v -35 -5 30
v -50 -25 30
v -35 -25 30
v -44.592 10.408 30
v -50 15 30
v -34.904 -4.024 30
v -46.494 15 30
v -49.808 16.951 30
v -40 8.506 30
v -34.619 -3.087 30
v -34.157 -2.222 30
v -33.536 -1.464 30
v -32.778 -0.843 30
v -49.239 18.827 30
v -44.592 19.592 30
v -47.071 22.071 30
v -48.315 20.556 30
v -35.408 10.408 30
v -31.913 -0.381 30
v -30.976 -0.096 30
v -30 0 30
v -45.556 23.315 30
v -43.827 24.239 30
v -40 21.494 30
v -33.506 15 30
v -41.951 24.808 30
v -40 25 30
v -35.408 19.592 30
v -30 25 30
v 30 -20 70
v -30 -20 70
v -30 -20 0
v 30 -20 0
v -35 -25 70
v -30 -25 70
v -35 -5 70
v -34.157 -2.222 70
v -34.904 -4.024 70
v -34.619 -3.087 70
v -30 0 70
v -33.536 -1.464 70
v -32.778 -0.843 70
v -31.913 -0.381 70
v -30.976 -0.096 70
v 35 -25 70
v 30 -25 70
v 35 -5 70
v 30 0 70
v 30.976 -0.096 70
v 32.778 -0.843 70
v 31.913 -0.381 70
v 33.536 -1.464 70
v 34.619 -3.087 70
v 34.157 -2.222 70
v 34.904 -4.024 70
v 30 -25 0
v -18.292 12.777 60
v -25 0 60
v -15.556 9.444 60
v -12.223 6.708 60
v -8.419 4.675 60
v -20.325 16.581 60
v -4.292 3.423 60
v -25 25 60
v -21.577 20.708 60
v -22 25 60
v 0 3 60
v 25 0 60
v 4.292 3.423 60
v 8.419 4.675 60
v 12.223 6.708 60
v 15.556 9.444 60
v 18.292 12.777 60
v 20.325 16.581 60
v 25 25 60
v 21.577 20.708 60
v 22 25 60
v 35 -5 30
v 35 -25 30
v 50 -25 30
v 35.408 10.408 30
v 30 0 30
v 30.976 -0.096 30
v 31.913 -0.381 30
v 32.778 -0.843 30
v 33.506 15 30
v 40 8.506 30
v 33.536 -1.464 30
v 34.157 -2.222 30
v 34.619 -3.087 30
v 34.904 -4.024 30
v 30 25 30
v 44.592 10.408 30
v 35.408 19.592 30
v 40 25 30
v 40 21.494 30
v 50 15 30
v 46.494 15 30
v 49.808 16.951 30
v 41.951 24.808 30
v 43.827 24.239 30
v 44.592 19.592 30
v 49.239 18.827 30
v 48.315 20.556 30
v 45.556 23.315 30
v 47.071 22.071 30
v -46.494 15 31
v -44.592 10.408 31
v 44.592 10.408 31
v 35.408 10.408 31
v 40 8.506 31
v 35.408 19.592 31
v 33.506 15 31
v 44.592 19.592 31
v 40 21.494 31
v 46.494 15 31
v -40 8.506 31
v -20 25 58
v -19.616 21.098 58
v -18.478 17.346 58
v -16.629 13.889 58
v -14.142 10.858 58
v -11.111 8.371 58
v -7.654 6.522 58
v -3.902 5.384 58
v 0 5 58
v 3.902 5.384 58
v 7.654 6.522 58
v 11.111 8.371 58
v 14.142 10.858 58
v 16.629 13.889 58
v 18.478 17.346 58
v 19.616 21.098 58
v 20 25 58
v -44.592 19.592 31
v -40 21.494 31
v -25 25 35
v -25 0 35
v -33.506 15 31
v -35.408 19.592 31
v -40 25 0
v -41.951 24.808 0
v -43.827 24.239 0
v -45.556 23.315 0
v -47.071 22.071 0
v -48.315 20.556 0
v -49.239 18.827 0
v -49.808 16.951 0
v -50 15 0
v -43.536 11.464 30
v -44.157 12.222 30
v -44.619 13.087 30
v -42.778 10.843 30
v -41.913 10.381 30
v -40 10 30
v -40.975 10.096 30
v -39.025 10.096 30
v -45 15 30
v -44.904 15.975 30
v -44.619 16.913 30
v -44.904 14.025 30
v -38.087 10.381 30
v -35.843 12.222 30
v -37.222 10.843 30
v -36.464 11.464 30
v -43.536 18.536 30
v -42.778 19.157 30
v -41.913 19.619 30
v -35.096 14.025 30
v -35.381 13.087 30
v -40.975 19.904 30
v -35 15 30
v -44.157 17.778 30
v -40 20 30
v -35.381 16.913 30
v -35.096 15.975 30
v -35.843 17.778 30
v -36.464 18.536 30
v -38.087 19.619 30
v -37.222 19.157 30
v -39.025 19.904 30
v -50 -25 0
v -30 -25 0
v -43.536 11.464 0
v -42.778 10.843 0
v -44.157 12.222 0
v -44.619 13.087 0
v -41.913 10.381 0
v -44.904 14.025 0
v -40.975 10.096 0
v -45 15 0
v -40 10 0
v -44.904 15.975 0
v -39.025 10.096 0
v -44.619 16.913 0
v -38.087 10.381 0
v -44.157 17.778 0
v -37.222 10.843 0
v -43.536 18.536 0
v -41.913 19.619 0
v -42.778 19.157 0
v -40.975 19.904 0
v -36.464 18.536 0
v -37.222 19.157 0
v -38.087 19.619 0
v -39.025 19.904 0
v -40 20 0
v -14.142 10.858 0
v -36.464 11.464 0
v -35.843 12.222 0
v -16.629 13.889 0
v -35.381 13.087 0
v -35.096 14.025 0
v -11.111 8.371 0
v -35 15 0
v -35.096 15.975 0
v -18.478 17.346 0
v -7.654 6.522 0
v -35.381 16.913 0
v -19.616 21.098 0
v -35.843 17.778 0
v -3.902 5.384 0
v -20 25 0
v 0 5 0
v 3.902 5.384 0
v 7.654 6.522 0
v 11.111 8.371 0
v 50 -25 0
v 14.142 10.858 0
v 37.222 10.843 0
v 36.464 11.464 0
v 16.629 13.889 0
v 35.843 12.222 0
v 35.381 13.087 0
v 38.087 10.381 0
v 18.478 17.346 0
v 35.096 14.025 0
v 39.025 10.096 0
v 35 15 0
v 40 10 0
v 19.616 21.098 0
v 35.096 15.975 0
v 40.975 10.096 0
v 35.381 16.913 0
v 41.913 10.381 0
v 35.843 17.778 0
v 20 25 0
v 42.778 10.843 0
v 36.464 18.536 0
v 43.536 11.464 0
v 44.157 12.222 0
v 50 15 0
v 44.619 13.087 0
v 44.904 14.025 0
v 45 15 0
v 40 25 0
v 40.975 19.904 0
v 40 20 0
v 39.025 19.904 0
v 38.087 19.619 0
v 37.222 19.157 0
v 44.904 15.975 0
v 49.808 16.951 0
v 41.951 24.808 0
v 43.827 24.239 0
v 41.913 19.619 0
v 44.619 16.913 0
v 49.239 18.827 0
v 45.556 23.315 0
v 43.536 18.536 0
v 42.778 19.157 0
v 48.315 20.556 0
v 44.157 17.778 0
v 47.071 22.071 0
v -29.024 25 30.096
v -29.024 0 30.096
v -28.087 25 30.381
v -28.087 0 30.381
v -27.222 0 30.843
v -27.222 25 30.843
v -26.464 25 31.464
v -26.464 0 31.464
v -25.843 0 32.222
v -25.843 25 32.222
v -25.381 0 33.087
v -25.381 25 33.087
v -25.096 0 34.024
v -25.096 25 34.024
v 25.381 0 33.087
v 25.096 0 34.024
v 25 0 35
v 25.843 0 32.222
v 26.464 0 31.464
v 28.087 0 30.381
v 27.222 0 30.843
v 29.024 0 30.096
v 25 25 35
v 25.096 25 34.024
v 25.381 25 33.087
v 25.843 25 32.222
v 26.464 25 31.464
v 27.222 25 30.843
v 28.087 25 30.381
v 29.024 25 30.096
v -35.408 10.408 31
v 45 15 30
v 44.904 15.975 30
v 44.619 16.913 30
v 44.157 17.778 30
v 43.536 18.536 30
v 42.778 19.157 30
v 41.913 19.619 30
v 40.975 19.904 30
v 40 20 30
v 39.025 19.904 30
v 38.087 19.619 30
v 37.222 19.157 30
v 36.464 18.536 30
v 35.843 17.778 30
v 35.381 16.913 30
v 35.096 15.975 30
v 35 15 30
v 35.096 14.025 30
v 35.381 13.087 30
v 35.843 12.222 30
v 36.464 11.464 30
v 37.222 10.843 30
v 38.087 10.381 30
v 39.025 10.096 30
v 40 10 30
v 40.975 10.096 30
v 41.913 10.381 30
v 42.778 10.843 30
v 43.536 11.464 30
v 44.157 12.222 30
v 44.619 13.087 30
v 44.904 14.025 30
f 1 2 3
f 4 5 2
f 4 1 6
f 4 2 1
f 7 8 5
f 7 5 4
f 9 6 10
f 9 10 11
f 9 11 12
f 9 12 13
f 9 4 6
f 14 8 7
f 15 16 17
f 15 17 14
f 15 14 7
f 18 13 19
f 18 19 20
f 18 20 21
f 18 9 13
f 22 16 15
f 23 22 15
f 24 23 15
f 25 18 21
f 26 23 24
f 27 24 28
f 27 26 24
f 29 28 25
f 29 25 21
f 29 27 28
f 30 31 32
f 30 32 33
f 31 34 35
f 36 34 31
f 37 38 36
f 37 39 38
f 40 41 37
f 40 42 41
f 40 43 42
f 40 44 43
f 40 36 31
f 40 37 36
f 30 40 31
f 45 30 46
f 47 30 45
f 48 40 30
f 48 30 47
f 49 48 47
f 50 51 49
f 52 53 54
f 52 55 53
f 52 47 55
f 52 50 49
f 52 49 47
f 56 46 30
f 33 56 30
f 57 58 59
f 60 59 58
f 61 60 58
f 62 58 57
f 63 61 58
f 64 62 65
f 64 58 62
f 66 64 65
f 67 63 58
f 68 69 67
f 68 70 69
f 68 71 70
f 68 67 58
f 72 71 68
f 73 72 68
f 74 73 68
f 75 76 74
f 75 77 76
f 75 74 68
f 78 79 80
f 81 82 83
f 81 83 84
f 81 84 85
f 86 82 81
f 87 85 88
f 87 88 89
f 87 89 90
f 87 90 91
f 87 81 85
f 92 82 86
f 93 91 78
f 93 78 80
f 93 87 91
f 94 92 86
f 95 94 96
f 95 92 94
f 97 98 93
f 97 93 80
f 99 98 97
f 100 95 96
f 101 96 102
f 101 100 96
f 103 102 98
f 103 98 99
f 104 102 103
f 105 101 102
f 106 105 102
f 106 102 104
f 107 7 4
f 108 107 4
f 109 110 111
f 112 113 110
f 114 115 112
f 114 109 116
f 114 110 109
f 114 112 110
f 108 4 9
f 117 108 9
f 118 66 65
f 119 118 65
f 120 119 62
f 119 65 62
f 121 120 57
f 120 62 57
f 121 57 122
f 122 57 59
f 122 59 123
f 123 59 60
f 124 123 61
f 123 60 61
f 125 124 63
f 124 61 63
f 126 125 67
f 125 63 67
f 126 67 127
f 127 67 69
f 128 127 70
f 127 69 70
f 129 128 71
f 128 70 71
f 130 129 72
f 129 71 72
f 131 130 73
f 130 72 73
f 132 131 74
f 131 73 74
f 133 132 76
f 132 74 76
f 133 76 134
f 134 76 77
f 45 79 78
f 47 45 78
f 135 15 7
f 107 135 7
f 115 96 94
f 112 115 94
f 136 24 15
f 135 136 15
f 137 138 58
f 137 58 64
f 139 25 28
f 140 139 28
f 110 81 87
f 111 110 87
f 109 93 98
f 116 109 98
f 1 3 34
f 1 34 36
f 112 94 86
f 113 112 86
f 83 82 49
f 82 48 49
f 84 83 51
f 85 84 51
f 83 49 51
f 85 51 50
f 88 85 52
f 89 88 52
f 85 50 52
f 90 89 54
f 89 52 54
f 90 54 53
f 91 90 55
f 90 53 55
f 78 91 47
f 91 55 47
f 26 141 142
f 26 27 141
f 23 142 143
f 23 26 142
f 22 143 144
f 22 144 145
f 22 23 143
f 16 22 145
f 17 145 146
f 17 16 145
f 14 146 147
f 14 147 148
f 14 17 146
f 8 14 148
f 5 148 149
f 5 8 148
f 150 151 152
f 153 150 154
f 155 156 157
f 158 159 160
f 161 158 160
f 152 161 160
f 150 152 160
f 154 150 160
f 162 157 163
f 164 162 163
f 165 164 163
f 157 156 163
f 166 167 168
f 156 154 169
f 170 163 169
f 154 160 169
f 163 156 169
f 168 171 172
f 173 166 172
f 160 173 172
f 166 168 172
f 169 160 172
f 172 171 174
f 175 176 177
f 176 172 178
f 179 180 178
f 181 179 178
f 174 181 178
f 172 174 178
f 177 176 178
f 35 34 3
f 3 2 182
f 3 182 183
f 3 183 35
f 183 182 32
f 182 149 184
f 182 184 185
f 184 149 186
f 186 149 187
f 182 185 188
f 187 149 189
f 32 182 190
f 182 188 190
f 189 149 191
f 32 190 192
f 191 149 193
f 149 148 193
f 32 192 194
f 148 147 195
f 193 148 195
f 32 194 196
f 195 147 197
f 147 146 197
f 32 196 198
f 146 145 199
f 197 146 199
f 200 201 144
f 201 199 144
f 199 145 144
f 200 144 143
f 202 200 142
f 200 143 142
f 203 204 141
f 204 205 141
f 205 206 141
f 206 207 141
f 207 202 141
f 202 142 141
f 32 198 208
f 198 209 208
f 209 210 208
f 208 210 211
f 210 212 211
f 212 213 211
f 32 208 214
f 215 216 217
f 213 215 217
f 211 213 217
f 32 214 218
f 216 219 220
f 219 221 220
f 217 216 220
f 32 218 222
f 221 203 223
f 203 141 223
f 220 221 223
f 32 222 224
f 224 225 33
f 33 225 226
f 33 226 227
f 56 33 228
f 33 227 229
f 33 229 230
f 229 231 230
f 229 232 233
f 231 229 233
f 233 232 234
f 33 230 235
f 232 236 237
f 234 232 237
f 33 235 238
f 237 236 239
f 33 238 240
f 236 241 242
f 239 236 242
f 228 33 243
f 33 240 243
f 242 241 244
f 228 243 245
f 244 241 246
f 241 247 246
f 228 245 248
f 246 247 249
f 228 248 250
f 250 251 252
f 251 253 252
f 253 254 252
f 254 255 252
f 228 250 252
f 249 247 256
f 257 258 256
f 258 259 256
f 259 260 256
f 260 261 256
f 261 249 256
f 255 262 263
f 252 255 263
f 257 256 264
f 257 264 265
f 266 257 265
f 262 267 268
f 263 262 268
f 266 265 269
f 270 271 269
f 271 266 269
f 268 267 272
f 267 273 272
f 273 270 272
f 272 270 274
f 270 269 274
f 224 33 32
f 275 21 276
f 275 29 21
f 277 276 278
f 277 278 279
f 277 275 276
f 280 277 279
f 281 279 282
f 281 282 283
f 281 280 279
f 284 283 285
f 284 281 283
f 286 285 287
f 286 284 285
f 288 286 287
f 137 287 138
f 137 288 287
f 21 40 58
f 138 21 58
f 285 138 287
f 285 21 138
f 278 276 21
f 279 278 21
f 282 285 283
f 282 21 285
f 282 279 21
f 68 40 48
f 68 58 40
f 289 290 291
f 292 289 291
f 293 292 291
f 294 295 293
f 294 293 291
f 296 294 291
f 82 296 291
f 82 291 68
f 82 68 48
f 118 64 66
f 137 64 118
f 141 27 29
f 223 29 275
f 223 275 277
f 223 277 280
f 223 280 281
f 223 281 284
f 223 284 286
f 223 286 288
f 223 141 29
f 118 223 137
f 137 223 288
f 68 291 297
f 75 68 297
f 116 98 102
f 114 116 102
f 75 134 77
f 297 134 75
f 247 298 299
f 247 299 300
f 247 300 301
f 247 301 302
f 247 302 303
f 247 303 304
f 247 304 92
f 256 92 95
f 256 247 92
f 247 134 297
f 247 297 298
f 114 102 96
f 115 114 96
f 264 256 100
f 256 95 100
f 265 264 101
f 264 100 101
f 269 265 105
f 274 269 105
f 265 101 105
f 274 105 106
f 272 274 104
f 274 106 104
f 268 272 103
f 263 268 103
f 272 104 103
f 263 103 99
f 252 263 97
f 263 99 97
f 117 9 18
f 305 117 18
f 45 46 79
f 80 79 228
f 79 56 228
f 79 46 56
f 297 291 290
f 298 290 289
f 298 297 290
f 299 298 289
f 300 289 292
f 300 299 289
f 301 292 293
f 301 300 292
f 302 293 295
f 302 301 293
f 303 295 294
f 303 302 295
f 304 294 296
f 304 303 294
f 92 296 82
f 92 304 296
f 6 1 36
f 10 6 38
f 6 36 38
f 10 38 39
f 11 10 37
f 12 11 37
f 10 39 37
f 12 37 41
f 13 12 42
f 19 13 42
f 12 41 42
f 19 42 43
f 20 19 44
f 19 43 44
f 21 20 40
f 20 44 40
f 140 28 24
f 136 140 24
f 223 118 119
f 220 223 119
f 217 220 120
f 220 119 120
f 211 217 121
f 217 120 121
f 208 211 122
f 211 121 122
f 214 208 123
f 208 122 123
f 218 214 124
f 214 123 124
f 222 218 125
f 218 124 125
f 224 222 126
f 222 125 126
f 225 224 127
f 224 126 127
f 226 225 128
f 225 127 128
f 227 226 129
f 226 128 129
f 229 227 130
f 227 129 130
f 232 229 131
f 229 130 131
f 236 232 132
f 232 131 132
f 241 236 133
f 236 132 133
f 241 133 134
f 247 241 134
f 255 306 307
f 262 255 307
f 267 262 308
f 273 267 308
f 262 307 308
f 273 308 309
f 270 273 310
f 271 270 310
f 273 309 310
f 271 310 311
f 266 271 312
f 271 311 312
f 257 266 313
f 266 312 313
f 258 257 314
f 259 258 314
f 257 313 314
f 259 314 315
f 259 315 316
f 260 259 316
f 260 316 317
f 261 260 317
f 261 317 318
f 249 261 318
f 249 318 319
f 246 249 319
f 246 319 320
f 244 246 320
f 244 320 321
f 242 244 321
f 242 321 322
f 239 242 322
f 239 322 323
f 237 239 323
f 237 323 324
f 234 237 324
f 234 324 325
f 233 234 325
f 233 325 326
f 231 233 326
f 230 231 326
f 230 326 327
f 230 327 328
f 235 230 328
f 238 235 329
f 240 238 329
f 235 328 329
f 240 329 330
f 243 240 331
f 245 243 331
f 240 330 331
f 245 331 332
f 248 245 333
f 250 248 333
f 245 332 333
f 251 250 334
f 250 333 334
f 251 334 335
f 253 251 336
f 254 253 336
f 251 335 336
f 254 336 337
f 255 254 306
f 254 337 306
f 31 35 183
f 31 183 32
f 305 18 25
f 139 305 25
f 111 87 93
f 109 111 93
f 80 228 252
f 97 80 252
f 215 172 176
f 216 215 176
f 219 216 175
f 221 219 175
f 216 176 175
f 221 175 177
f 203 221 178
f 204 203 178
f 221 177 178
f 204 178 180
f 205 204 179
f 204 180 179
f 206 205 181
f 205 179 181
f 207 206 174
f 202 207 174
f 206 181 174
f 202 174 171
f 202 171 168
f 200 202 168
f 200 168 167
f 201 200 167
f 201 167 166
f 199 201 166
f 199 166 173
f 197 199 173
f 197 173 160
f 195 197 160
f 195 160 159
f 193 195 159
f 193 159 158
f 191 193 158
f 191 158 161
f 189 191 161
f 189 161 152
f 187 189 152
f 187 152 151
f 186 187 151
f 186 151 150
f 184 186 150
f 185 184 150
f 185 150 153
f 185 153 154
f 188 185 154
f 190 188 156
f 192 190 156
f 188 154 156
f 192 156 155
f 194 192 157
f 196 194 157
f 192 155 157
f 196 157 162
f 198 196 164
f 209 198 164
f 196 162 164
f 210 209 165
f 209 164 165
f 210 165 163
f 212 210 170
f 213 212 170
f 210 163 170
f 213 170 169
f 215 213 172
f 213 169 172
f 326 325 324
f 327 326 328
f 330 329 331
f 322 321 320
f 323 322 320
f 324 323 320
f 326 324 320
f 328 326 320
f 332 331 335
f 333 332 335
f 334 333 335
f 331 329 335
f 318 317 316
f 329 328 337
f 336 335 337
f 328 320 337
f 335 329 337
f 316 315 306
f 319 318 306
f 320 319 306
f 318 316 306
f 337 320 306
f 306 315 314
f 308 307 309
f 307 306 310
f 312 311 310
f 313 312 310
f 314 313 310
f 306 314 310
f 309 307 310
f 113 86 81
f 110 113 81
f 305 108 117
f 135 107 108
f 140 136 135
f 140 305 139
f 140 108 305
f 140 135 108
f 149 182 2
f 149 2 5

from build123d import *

# Parameters (mm, degrees)
CROQUIS1_W              = 100
CROQUIS1_H              = 50
SALIENTE_EXTRUIR1_DEPTH = 30
CROQUIS2_W              = 70
CROQUIS2_H              = 25
SALIENTE_EXTRUIR2_DEPTH = 40
CROQUIS3_W              = 50
CROQUIS3_H              = 25
SALIENTE_EXTRUIR3_DEPTH = 30
CROQUIS4_R              = 20
CORTAR_EXTRUIR1_DEPTH   = 83.006097334
CHAFL_N1_SIZE           = 2
CROQUIS5_W              = 60
CROQUIS5_H              = 5
CORTAR_EXTRUIR2_DEPTH   = 90.582364336
REDONDEO1_R             = 10
REDONDEO2_R             = 5
CROQUIS6_R              = 5
CORTAR_EXTRUIR3_DEPTH   = 69.738635424
SALIENTE_EXTRUIR4_DEPTH = 1


with BuildPart() as part:
    # Croquis1 → Saliente-Extruir1 (new body)
    with BuildSketch(Plane.XY):
        Rectangle(CROQUIS1_W, CROQUIS1_H)
    extrude(amount=SALIENTE_EXTRUIR1_DEPTH)

    # Croquis2 → Saliente-Extruir2 (add)
    with BuildSketch(Plane.XY.offset(30)):
        with Locations((0, -12.5)):
            Rectangle(CROQUIS2_W, CROQUIS2_H)
    extrude(amount=SALIENTE_EXTRUIR2_DEPTH)

    # Croquis3 → Saliente-Extruir3 (add)
    with BuildSketch(Plane.XY.offset(30)):
        with Locations((0, 12.5)):
            Rectangle(CROQUIS3_W, CROQUIS3_H)
    extrude(amount=SALIENTE_EXTRUIR3_DEPTH)

    # Croquis4 → Cortar-Extruir1 (cut, through all)
    with BuildSketch(Plane.XY.offset(60)):
        with Locations((0, 25)):
            Circle(CROQUIS4_R)
    extrude(amount=-CORTAR_EXTRUIR1_DEPTH, mode=Mode.SUBTRACT)

    # Chaflán1
    chafl_n1_edges = [part.edges().sort_by_distance(p)[0] for p in [
        (0, 5, 60),
    ]]
    chamfer(chafl_n1_edges, length=CHAFL_N1_SIZE)

    # Croquis5 → Cortar-Extruir2 (cut, through all)
    with BuildSketch(Plane.XY.offset(70)):
        with Locations((0, -22.5)):
            Rectangle(CROQUIS5_W, CROQUIS5_H)
    extrude(amount=-CORTAR_EXTRUIR2_DEPTH, mode=Mode.SUBTRACT)

    # Redondeo1
    redondeo1_edges = [part.edges().sort_by_distance(p)[0] for p in [
        (-50, 25, 15),
        (50, 25, 15),
    ]]
    fillet(redondeo1_edges, radius=REDONDEO1_R)

    # Redondeo2
    redondeo2_edges = [part.edges().sort_by_distance(p)[0] for p in [
        (-35, 0, 50),
        (35, 0, 50),
        (-25, 12.5, 30),
        (25, 12.5, 30),
    ]]
    fillet(redondeo2_edges, radius=REDONDEO2_R - 0.0001)  # a hair under: the kernel refuses the full size

    # Croquis6 → Cortar-Extruir3 (cut, through all)
    with BuildSketch(Plane.XY.offset(30)):
        with Locations((-40, 15)):
            Circle(CROQUIS6_R)
        with Locations((40, 15)):
            Circle(CROQUIS6_R)
    extrude(amount=-CORTAR_EXTRUIR3_DEPTH, mode=Mode.SUBTRACT)

    # Croquis9 → Saliente-Extruir4 (add)
    with BuildSketch(Plane.XY.offset(30)):
        Polygon((-40, 21.494353202), (-44.592201188, 19.592201188), (-46.494353202, 15), (-44.592201188, 10.407798812), (-40, 8.505646798), (-35.407798812, 10.407798812), (-33.505646798, 15), (-35.407798812, 19.592201188), align=None)
        Polygon((40, 21.494353202), (35.407798812, 19.592201188), (33.505646798, 15), (35.407798812, 10.407798812), (40, 8.505646798), (44.592201188, 10.407798812), (46.494353202, 15), (44.592201188, 19.592201188), align=None)
    extrude(amount=SALIENTE_EXTRUIR4_DEPTH)


solid = part.part
